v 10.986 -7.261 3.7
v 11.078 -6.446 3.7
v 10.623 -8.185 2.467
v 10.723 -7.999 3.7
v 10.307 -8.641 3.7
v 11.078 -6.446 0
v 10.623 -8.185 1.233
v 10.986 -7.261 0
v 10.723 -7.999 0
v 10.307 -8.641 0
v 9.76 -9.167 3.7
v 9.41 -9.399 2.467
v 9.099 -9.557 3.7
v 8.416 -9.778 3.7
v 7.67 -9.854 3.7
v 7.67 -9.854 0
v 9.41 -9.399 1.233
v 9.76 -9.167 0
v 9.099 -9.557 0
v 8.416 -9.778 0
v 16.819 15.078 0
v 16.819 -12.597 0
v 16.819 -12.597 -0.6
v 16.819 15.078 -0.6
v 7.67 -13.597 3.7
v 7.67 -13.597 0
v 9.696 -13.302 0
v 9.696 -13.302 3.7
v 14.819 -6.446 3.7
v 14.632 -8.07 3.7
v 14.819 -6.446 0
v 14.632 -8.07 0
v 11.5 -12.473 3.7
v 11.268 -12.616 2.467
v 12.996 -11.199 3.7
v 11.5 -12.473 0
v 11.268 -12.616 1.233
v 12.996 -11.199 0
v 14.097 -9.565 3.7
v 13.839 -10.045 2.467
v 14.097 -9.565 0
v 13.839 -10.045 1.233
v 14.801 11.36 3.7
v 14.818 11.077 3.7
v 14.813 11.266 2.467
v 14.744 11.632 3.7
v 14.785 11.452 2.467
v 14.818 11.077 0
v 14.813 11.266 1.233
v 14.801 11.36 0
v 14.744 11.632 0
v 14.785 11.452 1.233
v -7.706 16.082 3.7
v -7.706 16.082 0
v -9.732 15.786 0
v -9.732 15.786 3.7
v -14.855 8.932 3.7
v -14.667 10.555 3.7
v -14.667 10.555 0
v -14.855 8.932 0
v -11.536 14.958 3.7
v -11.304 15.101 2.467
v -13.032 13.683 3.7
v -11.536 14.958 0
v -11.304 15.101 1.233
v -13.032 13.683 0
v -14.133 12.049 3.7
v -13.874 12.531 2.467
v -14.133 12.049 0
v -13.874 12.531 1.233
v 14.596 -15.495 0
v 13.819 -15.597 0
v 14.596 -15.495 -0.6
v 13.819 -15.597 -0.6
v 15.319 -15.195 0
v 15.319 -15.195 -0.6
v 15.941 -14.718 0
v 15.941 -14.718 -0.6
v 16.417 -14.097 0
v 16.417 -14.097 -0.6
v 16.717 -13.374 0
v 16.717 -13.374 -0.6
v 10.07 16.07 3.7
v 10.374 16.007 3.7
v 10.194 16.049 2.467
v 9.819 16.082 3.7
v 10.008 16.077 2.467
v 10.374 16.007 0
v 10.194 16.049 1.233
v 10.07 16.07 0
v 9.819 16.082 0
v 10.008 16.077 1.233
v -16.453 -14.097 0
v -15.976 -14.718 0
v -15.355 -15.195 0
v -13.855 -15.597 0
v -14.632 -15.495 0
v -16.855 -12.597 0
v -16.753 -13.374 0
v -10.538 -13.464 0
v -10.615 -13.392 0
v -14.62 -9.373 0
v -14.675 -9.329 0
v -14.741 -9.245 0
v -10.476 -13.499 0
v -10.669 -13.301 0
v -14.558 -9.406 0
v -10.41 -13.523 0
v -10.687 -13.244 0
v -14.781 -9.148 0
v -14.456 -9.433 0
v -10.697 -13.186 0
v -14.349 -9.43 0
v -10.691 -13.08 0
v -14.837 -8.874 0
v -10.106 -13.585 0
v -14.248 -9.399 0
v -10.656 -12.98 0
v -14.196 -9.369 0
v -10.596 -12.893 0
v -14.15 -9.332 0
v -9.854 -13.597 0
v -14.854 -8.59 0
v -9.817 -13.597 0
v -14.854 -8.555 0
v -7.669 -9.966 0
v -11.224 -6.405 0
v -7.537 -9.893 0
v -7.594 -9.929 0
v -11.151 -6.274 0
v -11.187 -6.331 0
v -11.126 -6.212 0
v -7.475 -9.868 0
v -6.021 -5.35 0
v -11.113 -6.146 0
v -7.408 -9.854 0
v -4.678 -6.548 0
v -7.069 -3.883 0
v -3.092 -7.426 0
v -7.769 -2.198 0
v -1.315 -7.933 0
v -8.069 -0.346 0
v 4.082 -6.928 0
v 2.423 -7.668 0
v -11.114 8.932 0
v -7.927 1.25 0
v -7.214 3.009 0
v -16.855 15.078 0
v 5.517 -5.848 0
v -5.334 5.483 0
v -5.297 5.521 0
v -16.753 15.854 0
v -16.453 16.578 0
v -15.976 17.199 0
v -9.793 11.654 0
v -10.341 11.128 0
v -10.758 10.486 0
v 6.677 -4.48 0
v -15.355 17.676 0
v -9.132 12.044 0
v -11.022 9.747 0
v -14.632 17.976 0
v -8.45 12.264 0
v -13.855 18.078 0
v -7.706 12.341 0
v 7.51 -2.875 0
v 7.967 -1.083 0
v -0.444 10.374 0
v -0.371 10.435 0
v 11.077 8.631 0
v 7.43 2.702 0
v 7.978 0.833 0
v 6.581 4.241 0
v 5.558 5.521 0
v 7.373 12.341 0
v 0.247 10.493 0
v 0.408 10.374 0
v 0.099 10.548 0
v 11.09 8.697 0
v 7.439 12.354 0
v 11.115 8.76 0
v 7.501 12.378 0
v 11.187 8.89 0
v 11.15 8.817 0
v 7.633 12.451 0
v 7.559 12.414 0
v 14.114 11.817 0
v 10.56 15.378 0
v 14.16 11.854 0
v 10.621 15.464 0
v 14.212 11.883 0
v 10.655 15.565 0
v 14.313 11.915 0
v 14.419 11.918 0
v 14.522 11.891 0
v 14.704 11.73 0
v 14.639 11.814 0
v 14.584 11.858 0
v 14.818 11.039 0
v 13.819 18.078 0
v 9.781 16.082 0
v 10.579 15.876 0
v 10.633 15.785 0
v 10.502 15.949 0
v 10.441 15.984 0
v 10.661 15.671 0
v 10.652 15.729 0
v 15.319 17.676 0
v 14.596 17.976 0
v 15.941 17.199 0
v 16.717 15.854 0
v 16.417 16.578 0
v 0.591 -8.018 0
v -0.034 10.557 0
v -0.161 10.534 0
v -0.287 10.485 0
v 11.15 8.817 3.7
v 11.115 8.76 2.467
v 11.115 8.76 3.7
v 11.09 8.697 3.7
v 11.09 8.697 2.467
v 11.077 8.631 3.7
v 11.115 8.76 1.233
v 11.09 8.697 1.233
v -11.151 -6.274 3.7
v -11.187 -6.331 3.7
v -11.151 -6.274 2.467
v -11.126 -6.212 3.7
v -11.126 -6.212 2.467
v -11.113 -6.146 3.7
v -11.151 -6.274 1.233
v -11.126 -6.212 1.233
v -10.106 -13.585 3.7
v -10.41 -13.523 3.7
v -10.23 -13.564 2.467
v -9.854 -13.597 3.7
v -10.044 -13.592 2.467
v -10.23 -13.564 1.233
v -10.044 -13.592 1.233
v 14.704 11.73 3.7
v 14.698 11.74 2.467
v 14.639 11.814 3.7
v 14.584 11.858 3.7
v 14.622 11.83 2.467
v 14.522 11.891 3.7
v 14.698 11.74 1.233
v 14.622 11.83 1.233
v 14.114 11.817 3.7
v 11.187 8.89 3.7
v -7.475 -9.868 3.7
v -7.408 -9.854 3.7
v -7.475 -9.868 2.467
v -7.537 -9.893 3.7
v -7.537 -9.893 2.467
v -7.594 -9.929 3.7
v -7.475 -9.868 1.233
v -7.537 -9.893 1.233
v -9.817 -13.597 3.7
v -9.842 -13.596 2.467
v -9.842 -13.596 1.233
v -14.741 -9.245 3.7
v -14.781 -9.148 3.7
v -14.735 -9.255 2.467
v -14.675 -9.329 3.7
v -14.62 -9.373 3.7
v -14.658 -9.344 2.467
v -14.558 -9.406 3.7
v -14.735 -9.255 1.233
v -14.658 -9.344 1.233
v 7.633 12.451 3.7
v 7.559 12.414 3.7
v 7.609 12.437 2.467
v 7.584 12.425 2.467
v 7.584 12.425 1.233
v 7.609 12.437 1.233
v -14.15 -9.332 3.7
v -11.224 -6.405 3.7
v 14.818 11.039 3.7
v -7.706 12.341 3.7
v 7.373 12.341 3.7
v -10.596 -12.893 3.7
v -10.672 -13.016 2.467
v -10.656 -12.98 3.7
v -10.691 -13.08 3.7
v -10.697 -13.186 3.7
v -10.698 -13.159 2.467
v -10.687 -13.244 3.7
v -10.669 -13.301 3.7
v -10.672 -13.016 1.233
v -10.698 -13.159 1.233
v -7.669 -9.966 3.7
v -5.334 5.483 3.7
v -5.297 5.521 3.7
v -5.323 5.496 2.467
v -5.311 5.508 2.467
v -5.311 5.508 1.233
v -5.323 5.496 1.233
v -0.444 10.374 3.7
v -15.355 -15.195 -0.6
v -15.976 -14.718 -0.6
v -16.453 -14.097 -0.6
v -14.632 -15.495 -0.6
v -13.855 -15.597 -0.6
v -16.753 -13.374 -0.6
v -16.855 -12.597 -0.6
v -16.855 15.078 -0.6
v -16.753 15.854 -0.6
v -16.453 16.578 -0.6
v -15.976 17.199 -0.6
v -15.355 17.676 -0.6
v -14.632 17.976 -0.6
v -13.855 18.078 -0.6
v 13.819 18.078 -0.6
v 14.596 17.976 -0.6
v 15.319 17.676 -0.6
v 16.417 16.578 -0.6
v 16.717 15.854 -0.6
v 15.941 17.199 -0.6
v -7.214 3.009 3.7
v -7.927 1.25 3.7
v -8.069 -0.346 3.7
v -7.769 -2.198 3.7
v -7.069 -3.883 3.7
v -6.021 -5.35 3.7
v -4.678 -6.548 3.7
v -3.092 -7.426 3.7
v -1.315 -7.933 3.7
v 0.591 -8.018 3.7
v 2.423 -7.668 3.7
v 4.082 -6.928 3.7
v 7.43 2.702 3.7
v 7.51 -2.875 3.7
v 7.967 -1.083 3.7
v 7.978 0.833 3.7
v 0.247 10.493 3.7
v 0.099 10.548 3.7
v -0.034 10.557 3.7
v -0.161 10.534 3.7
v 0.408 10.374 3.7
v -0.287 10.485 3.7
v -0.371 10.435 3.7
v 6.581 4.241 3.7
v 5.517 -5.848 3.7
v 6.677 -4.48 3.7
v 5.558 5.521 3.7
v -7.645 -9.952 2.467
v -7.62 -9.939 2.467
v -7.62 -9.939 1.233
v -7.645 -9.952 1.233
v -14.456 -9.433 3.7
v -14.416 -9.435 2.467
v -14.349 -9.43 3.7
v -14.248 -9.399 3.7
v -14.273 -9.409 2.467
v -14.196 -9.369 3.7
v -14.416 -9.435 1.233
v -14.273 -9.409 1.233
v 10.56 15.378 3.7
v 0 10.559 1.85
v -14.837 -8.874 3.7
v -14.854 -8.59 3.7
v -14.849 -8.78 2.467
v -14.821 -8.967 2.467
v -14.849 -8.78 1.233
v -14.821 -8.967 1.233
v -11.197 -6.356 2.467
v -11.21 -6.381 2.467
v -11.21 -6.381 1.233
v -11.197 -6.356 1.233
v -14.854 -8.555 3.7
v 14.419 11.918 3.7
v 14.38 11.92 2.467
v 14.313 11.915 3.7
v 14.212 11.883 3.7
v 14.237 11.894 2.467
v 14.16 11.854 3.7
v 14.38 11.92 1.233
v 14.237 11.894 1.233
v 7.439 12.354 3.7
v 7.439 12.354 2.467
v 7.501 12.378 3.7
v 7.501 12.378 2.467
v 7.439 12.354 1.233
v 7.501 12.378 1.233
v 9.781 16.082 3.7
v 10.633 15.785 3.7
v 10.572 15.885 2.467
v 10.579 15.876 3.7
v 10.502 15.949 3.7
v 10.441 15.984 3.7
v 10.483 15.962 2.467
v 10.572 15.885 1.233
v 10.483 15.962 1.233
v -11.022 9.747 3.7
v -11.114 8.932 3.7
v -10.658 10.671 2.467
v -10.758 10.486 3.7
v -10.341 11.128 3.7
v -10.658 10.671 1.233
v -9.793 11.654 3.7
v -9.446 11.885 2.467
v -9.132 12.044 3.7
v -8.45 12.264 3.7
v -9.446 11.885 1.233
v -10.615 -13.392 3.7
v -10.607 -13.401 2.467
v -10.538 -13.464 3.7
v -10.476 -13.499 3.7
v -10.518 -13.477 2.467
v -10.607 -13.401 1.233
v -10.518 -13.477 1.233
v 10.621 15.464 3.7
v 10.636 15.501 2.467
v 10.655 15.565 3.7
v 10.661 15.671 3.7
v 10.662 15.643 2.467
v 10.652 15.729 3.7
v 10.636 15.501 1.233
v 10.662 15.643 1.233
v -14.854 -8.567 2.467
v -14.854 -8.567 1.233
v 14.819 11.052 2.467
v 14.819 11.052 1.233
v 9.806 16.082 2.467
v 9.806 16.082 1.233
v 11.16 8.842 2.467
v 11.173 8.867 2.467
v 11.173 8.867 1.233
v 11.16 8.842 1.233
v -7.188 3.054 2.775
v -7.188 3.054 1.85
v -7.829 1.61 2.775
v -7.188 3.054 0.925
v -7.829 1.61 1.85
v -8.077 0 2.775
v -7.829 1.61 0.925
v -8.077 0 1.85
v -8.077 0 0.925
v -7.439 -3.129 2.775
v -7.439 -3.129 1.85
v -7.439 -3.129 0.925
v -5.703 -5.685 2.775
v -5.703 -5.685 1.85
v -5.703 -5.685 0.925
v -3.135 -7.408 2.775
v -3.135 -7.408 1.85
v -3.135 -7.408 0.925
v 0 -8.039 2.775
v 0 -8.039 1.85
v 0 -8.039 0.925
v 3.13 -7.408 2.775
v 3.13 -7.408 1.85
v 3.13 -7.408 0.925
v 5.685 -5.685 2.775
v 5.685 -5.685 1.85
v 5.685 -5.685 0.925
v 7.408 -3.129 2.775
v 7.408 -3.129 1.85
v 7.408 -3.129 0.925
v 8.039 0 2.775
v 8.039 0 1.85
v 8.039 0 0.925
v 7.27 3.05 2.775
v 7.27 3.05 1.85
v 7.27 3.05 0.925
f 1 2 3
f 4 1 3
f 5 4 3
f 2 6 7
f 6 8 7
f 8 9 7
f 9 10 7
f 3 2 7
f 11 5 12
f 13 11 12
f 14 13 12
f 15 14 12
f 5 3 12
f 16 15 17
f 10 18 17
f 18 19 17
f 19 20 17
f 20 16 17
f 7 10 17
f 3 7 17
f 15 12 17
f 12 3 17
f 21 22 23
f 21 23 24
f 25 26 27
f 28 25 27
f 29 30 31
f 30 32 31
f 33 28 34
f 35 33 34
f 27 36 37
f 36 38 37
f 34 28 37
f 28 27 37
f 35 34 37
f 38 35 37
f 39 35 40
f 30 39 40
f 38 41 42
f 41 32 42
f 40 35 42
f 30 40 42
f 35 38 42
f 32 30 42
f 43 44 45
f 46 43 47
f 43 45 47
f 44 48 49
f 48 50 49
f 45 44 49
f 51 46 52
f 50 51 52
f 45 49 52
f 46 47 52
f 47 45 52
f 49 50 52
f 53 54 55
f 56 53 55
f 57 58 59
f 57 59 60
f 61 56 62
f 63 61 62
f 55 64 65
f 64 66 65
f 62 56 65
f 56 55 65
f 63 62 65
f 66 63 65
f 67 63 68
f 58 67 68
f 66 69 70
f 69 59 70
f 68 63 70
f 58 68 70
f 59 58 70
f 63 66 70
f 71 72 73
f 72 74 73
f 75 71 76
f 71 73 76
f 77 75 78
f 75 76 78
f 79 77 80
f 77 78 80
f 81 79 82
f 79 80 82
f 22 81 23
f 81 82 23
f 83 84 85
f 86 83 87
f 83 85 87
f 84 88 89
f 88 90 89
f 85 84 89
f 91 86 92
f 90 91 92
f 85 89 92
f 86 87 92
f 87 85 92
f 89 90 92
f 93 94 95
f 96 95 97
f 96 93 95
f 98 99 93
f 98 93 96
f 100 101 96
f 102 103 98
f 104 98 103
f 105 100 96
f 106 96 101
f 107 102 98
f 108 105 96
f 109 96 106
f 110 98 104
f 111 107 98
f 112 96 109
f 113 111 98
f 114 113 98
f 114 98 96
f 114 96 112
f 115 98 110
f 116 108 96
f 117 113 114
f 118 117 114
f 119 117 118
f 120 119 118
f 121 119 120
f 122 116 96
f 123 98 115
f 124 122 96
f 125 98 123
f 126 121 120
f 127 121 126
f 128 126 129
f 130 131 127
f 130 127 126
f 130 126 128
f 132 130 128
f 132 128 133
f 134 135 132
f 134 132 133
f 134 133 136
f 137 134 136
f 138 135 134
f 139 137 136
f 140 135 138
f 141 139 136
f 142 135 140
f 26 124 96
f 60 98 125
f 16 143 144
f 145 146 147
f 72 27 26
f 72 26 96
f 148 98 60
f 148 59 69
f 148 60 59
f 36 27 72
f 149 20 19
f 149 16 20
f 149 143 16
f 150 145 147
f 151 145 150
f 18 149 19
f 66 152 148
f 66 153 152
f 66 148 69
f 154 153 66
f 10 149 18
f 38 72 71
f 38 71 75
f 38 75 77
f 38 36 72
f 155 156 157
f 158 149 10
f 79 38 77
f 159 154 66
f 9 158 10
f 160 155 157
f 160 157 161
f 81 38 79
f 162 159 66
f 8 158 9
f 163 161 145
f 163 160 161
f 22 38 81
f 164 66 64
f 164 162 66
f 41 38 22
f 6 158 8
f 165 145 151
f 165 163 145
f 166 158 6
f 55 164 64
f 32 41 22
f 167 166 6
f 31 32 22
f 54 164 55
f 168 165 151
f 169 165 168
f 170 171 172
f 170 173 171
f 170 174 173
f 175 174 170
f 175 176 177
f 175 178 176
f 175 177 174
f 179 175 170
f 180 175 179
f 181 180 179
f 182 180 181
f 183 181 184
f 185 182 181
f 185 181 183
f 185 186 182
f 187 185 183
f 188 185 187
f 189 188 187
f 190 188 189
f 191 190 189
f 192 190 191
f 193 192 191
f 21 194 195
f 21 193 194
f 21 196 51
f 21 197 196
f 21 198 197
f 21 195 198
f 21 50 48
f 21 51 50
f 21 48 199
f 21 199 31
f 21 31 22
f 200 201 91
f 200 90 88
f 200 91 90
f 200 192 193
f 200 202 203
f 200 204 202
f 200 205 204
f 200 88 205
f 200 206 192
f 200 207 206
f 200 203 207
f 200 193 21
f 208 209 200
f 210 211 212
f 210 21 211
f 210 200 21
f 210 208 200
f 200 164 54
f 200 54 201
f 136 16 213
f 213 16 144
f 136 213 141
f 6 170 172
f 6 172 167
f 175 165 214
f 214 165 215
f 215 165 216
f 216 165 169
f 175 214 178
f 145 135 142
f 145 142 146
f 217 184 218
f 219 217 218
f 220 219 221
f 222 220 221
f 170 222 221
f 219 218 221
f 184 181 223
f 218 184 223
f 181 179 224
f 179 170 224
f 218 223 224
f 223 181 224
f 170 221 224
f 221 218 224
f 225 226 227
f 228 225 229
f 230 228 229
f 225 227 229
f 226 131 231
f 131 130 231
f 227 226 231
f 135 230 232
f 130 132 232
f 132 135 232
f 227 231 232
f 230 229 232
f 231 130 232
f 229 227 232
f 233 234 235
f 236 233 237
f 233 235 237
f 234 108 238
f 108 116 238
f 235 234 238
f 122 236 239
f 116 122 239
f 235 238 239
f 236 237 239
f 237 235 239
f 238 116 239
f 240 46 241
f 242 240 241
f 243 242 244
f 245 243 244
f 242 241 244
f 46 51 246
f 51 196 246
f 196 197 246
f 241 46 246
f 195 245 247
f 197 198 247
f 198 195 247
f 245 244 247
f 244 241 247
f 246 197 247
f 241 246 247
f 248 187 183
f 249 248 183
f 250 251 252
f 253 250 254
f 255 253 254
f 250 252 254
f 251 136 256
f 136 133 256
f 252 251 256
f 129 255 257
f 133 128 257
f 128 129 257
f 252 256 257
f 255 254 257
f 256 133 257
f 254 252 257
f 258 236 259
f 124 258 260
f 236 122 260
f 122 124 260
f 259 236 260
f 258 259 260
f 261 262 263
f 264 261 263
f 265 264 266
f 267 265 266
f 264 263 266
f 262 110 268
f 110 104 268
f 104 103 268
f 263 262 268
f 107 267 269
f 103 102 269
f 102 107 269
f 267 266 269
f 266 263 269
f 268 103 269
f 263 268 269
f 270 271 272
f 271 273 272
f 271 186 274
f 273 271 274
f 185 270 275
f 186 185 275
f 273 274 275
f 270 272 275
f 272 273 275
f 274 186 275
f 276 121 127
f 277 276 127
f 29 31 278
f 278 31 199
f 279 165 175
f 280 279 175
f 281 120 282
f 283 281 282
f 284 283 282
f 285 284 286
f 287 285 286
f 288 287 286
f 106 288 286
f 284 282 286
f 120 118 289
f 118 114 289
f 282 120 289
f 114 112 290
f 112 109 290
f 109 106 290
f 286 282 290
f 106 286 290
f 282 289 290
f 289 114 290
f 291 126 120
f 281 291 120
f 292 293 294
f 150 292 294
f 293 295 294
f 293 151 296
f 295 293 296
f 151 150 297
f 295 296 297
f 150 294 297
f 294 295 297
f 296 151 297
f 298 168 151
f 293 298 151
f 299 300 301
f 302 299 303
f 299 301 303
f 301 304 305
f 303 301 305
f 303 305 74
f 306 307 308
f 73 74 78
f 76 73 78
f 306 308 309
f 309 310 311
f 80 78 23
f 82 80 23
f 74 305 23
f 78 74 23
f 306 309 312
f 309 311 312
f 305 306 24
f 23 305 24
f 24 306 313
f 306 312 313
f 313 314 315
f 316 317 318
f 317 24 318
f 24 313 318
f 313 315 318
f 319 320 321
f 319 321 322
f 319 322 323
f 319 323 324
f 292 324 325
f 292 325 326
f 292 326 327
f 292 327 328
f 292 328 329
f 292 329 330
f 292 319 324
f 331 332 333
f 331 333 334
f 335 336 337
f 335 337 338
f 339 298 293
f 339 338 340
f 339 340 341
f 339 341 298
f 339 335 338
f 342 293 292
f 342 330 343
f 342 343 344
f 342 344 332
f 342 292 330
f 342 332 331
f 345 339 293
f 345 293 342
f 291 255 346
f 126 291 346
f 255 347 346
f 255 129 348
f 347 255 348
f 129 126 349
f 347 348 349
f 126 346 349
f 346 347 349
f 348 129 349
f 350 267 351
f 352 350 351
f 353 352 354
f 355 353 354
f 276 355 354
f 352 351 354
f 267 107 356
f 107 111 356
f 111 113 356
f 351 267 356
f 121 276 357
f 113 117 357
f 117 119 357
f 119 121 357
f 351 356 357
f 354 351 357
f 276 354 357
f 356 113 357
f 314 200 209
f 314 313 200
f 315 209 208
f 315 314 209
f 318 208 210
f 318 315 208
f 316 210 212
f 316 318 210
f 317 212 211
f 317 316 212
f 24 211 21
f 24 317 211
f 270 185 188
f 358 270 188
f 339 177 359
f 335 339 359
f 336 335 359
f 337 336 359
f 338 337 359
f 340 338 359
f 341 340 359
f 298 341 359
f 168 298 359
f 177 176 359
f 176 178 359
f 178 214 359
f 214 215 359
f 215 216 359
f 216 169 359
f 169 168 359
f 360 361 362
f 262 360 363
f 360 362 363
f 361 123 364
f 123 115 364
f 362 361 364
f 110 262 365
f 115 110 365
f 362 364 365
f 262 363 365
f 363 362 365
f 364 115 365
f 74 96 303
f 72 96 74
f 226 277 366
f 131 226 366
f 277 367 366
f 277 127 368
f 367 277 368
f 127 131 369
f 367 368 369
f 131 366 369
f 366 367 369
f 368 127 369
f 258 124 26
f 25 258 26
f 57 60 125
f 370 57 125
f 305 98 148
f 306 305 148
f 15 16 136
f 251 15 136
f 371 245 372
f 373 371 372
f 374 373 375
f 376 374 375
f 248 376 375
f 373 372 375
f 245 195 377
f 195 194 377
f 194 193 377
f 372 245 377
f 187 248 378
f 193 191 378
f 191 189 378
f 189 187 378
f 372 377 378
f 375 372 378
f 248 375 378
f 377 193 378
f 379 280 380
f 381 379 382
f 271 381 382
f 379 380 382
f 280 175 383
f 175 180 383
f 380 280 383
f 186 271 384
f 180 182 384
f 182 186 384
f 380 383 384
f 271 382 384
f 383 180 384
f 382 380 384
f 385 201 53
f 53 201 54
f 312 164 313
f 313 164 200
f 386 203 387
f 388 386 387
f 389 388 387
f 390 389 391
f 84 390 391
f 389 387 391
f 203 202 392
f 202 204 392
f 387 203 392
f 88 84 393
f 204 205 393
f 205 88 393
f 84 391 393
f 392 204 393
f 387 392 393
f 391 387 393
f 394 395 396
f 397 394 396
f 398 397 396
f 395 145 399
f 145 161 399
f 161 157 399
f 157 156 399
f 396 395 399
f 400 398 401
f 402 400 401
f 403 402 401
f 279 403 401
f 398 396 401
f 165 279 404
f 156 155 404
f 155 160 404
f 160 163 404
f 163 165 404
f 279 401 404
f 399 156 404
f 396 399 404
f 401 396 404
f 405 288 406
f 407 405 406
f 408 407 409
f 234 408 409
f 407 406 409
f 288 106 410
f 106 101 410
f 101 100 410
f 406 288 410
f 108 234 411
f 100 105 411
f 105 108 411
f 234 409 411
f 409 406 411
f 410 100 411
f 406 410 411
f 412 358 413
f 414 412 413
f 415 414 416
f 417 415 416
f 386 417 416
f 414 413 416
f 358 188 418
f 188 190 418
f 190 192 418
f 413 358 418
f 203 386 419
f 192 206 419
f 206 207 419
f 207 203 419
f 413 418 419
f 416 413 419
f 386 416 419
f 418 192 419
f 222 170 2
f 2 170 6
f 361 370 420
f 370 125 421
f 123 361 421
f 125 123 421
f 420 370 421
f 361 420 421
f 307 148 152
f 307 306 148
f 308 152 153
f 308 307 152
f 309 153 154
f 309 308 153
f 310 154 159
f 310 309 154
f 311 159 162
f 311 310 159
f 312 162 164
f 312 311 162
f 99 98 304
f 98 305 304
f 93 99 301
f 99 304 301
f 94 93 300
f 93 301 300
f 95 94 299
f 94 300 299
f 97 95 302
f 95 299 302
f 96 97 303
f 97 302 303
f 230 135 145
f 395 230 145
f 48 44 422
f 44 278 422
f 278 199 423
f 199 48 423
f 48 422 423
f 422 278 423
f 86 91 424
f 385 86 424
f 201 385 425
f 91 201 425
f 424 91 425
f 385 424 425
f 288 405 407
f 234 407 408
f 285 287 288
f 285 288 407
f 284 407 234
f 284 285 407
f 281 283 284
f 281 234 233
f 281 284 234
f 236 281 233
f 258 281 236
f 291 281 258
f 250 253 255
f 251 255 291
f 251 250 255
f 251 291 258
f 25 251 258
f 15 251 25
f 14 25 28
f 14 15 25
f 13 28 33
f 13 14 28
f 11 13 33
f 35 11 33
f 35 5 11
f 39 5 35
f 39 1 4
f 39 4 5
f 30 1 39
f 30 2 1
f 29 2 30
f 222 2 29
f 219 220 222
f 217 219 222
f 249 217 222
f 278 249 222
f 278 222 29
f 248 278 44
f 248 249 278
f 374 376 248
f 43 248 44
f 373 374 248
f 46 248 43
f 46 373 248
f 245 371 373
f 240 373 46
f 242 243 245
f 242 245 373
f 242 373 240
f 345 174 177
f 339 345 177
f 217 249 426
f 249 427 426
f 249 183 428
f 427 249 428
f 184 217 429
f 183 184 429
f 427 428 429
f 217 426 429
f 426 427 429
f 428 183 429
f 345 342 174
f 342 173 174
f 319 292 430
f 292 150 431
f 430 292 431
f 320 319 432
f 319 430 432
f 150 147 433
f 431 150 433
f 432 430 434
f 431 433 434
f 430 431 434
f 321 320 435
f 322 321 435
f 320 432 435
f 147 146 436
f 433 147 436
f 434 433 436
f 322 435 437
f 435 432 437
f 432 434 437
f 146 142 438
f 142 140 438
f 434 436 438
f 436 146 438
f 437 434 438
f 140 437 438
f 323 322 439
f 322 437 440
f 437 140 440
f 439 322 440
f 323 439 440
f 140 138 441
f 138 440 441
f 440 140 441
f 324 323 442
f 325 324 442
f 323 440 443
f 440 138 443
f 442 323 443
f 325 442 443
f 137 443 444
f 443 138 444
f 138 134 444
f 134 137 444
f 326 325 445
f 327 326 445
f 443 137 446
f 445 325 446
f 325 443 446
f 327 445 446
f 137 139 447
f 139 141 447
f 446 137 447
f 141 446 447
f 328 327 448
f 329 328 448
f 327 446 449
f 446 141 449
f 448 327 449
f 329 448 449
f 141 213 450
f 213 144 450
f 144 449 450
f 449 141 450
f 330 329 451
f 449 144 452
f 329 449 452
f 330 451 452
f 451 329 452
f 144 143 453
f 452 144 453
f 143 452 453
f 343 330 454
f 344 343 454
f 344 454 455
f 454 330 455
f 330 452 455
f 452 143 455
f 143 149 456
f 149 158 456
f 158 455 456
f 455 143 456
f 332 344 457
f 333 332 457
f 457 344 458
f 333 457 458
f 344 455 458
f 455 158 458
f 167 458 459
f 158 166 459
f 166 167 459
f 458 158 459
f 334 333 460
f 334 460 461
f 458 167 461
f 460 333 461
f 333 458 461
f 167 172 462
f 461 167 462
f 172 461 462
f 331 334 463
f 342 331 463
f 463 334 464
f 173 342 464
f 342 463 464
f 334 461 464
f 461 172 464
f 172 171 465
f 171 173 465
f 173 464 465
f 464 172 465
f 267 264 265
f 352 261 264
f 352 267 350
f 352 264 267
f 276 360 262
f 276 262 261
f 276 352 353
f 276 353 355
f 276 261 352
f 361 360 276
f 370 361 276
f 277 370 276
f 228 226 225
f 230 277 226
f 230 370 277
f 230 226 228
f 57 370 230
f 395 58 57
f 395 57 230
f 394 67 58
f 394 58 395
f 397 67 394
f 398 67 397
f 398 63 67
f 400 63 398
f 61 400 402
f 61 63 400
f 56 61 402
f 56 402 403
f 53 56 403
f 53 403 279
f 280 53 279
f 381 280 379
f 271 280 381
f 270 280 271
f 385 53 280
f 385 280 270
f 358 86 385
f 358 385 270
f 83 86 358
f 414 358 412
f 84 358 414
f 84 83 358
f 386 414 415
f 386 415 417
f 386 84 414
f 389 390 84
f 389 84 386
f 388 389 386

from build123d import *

# Parameters (mm, degrees)
BOSS_EXTRUDE1_DEPTH   = 3.7
BOSS_EXTRUDE1_2_DEPTH = 3.7
BOSS_EXTRUDE1_3_DEPTH = 3.7
SKETCH2_W             = 33.674533553
SKETCH2_H             = 33.674874065
BOSS_EXTRUDE2_DEPTH   = 0.6
FILLET1_R             = 3


with BuildPart() as part:
    # Sketch1 → Boss-Extrude1 (new body)
    with BuildSketch(Plane.XY):
        with BuildLine():
            Line((-0.443865, 10.373853), (-5.297311, 5.52069))
            add(Edge.make_bspline(
                [(-5.297311, 5.52069), (-5.311105, 5.508025), (-5.323488, 5.495607), (-5.334388, 5.483225)],
                knots=[0, 0, 0, 0, 1, 1, 1, 1], degree=3))
            add(Edge.make_bspline(
                [(-5.334388, 5.483225), (-6.621322, 4.056944), (-8.07653, 2.259965), (-8.07653, 0)],
                knots=[0, 0, 0, 0, 1, 1, 1, 1], degree=3))
            add(Edge.make_bspline(
                [(-8.07653, 0), (-8.07653, -4.440026), (-4.43865, -8.039347), (0, -8.039347)],
                knots=[0, 0, 0, 0, 1, 1, 1, 1], degree=3))
            add(Edge.make_bspline(
                [(0, -8.039347), (4.441401, -8.039347), (8.039488, -4.440026), (8.039488, 0)],
                knots=[0, 0, 0, 0, 1, 1, 1, 1], degree=3))
            add(Edge.make_bspline(
                [(8.039488, 0), (8.039488, 2.101497), (6.815631, 4.190753), (5.557626, 5.52069)],
                knots=[0, 0, 0, 0, 1, 1, 1, 1], degree=3))
            Line((5.557626, 5.52069), (0.407776, 10.373853))
            add(Edge.make_bspline(
                [(0.407776, 10.373853), (0.294887, 10.482862), (0.154481, 10.558674), (0, 10.558674)],
                knots=[0, 0, 0, 0, 1, 1, 1, 1], degree=3))
            add(Edge.make_bspline(
                [(0, 10.558674), (-0.150354, 10.558674), (-0.329495, 10.486989), (-0.443865, 10.373853)],
                knots=[0, 0, 0, 0, 1, 1, 1, 1], degree=3))
        make_face()
    extrude(amount=BOSS_EXTRUDE1_DEPTH)



with BuildPart() as body_2:
    # Sketch1 → Boss-Extrude1 2 (new body)
    with BuildSketch(Plane.XY):
        with BuildLine():
            Line((-7.706114447, 12.34059), (7.372630553, 12.34059))
            add(Edge.make_bspline(
                [(7.372630553, 12.34059), (7.440010553, 12.347222), (7.504922553, 12.373398), (7.558544553, 12.41365)],
                knots=[0, 0, 0, 0, 1, 1, 1, 1], degree=3))
            add(Edge.make_bspline(
                [(7.558544553, 12.41365), (7.584720553, 12.424515), (7.609379553, 12.435416), (7.633086553, 12.450586)],
                knots=[0, 0, 0, 0, 1, 1, 1, 1], degree=3))
            Line((7.633086553, 12.450586), (10.560048553, 15.377653))
            add(Edge.make_bspline(
                [(10.560048553, 15.377653), (10.660484553, 15.483769), (10.690964553, 15.650386), (10.633073553, 15.785429)],
                knots=[0, 0, 0, 0, 1, 1, 1, 1], degree=3))
            add(Edge.make_bspline(
                [(10.633073553, 15.785429), (10.588975553, 15.894438), (10.489492553, 15.97988), (10.373746553, 16.007291)],
                knots=[0, 0, 0, 0, 1, 1, 1, 1], degree=3))
            add(Edge.make_bspline(
                [(10.373746553, 16.007291), (10.197357553, 16.052905), (10.008691553, 16.091358), (9.818509553, 16.081833)],
                knots=[0, 0, 0, 0, 1, 1, 1, 1], degree=3))
            add(Edge.make_bspline(
                [(9.818509553, 16.081833), (9.806126553, 16.081833), (9.793850553, 16.083209), (9.781432553, 16.081833)],
                knots=[0, 0, 0, 0, 1, 1, 1, 1], degree=3))
            Line((9.781432553, 16.081833), (-7.706111553, 16.081833))
            add(Edge.make_bspline(
                [(-7.706111553, 16.081833), (-11.630782553, 16.081833), (-14.855115553, 12.858467), (-14.855115553, 8.932298)],
                knots=[0, 0, 0, 0, 1, 1, 1, 1], degree=3))
            Line((-14.855115553, 8.932298), (-14.853739447, -8.554862))
            add(Edge.make_bspline(
                [(-14.853739447, -8.554862), (-14.855118447, -8.567138), (-14.853739447, -8.578145), (-14.853739447, -8.590422)],
                knots=[0, 0, 0, 0, 1, 1, 1, 1], degree=3))
            add(Edge.make_bspline(
                [(-14.853739447, -8.590422), (-14.863661447, -8.78198), (-14.824801447, -8.969658), (-14.780703447, -9.147563)],
                knots=[0, 0, 0, 0, 1, 1, 1, 1], degree=3))
            add(Edge.make_bspline(
                [(-14.780703447, -9.147563), (-14.751765447, -9.261793), (-14.667842447, -9.360888), (-14.557736447, -9.406361)],
                knots=[0, 0, 0, 0, 1, 1, 1, 1], degree=3))
            add(Edge.make_bspline(
                [(-14.557736447, -9.406361), (-14.424069447, -9.464217), (-14.255808447, -9.433913), (-14.149562447, -9.331925)],
                knots=[0, 0, 0, 0, 1, 1, 1, 1], degree=3))
            Line((-14.149562447, -9.331925), (-11.223979447, -6.404998))
            add(Edge.make_bspline(
                [(-11.223979447, -6.404998), (-11.208845447, -6.381715), (-11.196568447, -6.356633), (-11.186902447, -6.330562)],
                knots=[0, 0, 0, 0, 1, 1, 1, 1], degree=3))
            add(Edge.make_bspline(
                [(-11.186902447, -6.330562), (-11.145698447, -6.278351), (-11.119239447, -6.21344), (-11.112501447, -6.14606)],
                knots=[0, 0, 0, 0, 1, 1, 1, 1], degree=3))
            Line((-11.112501447, -6.14606), (-11.113877447, 8.932298))
            add(Edge.make_bspline(
                [(-11.113877447, 8.932298), (-11.113877447, 10.856453), (-9.632634447, 12.34059), (-7.706114447, 12.34059)],
                knots=[0, 0, 0, 0, 1, 1, 1, 1], degree=3))
        make_face()
    extrude(amount=BOSS_EXTRUDE1_2_DEPTH)


with BuildPart() as body_3:
    # Sketch1 → Boss-Extrude1 3 (new body)
    with BuildSketch(Plane.XY):
        with BuildLine():
            Line((7.670024, -9.854495), (-7.408334, -9.854495))
            add(Edge.make_bspline(
                [(-7.408334, -9.854495), (-7.475714, -9.862609), (-7.540625, -9.888679), (-7.594248, -9.928508)],
                knots=[0, 0, 0, 0, 1, 1, 1, 1], degree=3))
            add(Edge.make_bspline(
                [(-7.594248, -9.928508), (-7.620424, -9.938421), (-7.645506, -9.950803), (-7.668789, -9.965973)],
                knots=[0, 0, 0, 0, 1, 1, 1, 1], degree=3))
            Line((-7.668789, -9.965973), (-10.595751, -12.892928))
            add(Edge.make_bspline(
                [(-10.595751, -12.892928), (-10.696187, -12.999177), (-10.726667, -13.165642), (-10.668776, -13.300689)],
                knots=[0, 0, 0, 0, 1, 1, 1, 1], degree=3))
            add(Edge.make_bspline(
                [(-10.668776, -13.300689), (-10.624679, -13.409694), (-10.524067, -13.495133), (-10.409838, -13.522692)],
                knots=[0, 0, 0, 0, 1, 1, 1, 1], degree=3))
            add(Edge.make_bspline(
                [(-10.409838, -13.522692), (-10.233449, -13.568169), (-10.044677, -13.606615), (-9.854495, -13.597107)],
                knots=[0, 0, 0, 0, 1, 1, 1, 1], degree=3))
            add(Edge.make_bspline(
                [(-9.854495, -13.597107), (-9.84183, -13.59559), (-9.829553, -13.597107), (-9.817136, -13.597107)],
                knots=[0, 0, 0, 0, 1, 1, 1, 1], degree=3))
            Line((-9.817136, -13.597107), (7.670024, -13.597107))
            add(Edge.make_bspline(
                [(7.670024, -13.597107), (11.594676, -13.597107), (14.820935, -10.372373), (14.819418, -6.446344)],
                knots=[0, 0, 0, 0, 1, 1, 1, 1], degree=3))
            Line((14.819418, -6.446344), (14.818042, 11.039475))
            add(Edge.make_bspline(
                [(14.818042, 11.039475), (14.819418, 11.051857), (14.818042, 11.064275), (14.818042, 11.07694)],
                knots=[0, 0, 0, 0, 1, 1, 1, 1], degree=3))
            add(Edge.make_bspline(
                [(14.818042, 11.07694), (14.827567, 11.267122), (14.789114, 11.455752), (14.743641, 11.632141)],
                knots=[0, 0, 0, 0, 1, 1, 1, 1], degree=3))
            add(Edge.make_bspline(
                [(14.743641, 11.632141), (14.716054, 11.746547), (14.630752, 11.846983), (14.521779, 11.89108)],
                knots=[0, 0, 0, 0, 1, 1, 1, 1], degree=3))
            add(Edge.make_bspline(
                [(14.521779, 11.89108), (14.386595, 11.948971), (14.220119, 11.918632), (14.113862, 11.816679)],
                knots=[0, 0, 0, 0, 1, 1, 1, 1], degree=3))
            Line((14.113862, 11.816679), (11.186901, 8.889717))
            add(Edge.make_bspline(
                [(11.186901, 8.889717), (11.171766, 8.86781), (11.159349, 8.841775), (11.149859, 8.816692)],
                knots=[0, 0, 0, 0, 1, 1, 1, 1], degree=3))
            add(Edge.make_bspline(
                [(11.149859, 8.816692), (11.109607, 8.76307), (11.083572, 8.698159), (11.076799, 8.630778)],
                knots=[0, 0, 0, 0, 1, 1, 1, 1], degree=3))
            Line((11.076799, 8.630778), (11.077892, -6.446344))
            add(Edge.make_bspline(
                [(11.077892, -6.446344), (11.079303, -8.371311), (9.596508, -9.854495), (7.670024, -9.854495)],
                knots=[0, 0, 0, 0, 1, 1, 1, 1], degree=3))
        make_face()
    extrude(amount=BOSS_EXTRUDE1_3_DEPTH)


with BuildPart() as part_1:
    add(part.part)

    add(body_2.part)  # Boss-Extrude2 merges body 2

    add(body_3.part)  # Boss-Extrude2 merges body 3
    # Sketch2 → Boss-Extrude2 (add)
    with BuildSketch(Plane.XY):
        with Locations((-0.017848776, 1.240330032)):
            Rectangle(SKETCH2_W, SKETCH2_H)
    extrude(amount=-BOSS_EXTRUDE2_DEPTH)

    # Fillet1
    fillet1_edges = [part_1.edges().sort_by_distance(p)[0] for p in [
        (-16.855115553, -15.597107, -0.3),
        (-16.855115553, 18.077767065, -0.3),
        (16.819418, 18.077767065, -0.3),
        (16.819418, -15.597107, -0.3),
    ]]
    fillet(fillet1_edges, radius=FILLET1_R)


solid = part_1.part
